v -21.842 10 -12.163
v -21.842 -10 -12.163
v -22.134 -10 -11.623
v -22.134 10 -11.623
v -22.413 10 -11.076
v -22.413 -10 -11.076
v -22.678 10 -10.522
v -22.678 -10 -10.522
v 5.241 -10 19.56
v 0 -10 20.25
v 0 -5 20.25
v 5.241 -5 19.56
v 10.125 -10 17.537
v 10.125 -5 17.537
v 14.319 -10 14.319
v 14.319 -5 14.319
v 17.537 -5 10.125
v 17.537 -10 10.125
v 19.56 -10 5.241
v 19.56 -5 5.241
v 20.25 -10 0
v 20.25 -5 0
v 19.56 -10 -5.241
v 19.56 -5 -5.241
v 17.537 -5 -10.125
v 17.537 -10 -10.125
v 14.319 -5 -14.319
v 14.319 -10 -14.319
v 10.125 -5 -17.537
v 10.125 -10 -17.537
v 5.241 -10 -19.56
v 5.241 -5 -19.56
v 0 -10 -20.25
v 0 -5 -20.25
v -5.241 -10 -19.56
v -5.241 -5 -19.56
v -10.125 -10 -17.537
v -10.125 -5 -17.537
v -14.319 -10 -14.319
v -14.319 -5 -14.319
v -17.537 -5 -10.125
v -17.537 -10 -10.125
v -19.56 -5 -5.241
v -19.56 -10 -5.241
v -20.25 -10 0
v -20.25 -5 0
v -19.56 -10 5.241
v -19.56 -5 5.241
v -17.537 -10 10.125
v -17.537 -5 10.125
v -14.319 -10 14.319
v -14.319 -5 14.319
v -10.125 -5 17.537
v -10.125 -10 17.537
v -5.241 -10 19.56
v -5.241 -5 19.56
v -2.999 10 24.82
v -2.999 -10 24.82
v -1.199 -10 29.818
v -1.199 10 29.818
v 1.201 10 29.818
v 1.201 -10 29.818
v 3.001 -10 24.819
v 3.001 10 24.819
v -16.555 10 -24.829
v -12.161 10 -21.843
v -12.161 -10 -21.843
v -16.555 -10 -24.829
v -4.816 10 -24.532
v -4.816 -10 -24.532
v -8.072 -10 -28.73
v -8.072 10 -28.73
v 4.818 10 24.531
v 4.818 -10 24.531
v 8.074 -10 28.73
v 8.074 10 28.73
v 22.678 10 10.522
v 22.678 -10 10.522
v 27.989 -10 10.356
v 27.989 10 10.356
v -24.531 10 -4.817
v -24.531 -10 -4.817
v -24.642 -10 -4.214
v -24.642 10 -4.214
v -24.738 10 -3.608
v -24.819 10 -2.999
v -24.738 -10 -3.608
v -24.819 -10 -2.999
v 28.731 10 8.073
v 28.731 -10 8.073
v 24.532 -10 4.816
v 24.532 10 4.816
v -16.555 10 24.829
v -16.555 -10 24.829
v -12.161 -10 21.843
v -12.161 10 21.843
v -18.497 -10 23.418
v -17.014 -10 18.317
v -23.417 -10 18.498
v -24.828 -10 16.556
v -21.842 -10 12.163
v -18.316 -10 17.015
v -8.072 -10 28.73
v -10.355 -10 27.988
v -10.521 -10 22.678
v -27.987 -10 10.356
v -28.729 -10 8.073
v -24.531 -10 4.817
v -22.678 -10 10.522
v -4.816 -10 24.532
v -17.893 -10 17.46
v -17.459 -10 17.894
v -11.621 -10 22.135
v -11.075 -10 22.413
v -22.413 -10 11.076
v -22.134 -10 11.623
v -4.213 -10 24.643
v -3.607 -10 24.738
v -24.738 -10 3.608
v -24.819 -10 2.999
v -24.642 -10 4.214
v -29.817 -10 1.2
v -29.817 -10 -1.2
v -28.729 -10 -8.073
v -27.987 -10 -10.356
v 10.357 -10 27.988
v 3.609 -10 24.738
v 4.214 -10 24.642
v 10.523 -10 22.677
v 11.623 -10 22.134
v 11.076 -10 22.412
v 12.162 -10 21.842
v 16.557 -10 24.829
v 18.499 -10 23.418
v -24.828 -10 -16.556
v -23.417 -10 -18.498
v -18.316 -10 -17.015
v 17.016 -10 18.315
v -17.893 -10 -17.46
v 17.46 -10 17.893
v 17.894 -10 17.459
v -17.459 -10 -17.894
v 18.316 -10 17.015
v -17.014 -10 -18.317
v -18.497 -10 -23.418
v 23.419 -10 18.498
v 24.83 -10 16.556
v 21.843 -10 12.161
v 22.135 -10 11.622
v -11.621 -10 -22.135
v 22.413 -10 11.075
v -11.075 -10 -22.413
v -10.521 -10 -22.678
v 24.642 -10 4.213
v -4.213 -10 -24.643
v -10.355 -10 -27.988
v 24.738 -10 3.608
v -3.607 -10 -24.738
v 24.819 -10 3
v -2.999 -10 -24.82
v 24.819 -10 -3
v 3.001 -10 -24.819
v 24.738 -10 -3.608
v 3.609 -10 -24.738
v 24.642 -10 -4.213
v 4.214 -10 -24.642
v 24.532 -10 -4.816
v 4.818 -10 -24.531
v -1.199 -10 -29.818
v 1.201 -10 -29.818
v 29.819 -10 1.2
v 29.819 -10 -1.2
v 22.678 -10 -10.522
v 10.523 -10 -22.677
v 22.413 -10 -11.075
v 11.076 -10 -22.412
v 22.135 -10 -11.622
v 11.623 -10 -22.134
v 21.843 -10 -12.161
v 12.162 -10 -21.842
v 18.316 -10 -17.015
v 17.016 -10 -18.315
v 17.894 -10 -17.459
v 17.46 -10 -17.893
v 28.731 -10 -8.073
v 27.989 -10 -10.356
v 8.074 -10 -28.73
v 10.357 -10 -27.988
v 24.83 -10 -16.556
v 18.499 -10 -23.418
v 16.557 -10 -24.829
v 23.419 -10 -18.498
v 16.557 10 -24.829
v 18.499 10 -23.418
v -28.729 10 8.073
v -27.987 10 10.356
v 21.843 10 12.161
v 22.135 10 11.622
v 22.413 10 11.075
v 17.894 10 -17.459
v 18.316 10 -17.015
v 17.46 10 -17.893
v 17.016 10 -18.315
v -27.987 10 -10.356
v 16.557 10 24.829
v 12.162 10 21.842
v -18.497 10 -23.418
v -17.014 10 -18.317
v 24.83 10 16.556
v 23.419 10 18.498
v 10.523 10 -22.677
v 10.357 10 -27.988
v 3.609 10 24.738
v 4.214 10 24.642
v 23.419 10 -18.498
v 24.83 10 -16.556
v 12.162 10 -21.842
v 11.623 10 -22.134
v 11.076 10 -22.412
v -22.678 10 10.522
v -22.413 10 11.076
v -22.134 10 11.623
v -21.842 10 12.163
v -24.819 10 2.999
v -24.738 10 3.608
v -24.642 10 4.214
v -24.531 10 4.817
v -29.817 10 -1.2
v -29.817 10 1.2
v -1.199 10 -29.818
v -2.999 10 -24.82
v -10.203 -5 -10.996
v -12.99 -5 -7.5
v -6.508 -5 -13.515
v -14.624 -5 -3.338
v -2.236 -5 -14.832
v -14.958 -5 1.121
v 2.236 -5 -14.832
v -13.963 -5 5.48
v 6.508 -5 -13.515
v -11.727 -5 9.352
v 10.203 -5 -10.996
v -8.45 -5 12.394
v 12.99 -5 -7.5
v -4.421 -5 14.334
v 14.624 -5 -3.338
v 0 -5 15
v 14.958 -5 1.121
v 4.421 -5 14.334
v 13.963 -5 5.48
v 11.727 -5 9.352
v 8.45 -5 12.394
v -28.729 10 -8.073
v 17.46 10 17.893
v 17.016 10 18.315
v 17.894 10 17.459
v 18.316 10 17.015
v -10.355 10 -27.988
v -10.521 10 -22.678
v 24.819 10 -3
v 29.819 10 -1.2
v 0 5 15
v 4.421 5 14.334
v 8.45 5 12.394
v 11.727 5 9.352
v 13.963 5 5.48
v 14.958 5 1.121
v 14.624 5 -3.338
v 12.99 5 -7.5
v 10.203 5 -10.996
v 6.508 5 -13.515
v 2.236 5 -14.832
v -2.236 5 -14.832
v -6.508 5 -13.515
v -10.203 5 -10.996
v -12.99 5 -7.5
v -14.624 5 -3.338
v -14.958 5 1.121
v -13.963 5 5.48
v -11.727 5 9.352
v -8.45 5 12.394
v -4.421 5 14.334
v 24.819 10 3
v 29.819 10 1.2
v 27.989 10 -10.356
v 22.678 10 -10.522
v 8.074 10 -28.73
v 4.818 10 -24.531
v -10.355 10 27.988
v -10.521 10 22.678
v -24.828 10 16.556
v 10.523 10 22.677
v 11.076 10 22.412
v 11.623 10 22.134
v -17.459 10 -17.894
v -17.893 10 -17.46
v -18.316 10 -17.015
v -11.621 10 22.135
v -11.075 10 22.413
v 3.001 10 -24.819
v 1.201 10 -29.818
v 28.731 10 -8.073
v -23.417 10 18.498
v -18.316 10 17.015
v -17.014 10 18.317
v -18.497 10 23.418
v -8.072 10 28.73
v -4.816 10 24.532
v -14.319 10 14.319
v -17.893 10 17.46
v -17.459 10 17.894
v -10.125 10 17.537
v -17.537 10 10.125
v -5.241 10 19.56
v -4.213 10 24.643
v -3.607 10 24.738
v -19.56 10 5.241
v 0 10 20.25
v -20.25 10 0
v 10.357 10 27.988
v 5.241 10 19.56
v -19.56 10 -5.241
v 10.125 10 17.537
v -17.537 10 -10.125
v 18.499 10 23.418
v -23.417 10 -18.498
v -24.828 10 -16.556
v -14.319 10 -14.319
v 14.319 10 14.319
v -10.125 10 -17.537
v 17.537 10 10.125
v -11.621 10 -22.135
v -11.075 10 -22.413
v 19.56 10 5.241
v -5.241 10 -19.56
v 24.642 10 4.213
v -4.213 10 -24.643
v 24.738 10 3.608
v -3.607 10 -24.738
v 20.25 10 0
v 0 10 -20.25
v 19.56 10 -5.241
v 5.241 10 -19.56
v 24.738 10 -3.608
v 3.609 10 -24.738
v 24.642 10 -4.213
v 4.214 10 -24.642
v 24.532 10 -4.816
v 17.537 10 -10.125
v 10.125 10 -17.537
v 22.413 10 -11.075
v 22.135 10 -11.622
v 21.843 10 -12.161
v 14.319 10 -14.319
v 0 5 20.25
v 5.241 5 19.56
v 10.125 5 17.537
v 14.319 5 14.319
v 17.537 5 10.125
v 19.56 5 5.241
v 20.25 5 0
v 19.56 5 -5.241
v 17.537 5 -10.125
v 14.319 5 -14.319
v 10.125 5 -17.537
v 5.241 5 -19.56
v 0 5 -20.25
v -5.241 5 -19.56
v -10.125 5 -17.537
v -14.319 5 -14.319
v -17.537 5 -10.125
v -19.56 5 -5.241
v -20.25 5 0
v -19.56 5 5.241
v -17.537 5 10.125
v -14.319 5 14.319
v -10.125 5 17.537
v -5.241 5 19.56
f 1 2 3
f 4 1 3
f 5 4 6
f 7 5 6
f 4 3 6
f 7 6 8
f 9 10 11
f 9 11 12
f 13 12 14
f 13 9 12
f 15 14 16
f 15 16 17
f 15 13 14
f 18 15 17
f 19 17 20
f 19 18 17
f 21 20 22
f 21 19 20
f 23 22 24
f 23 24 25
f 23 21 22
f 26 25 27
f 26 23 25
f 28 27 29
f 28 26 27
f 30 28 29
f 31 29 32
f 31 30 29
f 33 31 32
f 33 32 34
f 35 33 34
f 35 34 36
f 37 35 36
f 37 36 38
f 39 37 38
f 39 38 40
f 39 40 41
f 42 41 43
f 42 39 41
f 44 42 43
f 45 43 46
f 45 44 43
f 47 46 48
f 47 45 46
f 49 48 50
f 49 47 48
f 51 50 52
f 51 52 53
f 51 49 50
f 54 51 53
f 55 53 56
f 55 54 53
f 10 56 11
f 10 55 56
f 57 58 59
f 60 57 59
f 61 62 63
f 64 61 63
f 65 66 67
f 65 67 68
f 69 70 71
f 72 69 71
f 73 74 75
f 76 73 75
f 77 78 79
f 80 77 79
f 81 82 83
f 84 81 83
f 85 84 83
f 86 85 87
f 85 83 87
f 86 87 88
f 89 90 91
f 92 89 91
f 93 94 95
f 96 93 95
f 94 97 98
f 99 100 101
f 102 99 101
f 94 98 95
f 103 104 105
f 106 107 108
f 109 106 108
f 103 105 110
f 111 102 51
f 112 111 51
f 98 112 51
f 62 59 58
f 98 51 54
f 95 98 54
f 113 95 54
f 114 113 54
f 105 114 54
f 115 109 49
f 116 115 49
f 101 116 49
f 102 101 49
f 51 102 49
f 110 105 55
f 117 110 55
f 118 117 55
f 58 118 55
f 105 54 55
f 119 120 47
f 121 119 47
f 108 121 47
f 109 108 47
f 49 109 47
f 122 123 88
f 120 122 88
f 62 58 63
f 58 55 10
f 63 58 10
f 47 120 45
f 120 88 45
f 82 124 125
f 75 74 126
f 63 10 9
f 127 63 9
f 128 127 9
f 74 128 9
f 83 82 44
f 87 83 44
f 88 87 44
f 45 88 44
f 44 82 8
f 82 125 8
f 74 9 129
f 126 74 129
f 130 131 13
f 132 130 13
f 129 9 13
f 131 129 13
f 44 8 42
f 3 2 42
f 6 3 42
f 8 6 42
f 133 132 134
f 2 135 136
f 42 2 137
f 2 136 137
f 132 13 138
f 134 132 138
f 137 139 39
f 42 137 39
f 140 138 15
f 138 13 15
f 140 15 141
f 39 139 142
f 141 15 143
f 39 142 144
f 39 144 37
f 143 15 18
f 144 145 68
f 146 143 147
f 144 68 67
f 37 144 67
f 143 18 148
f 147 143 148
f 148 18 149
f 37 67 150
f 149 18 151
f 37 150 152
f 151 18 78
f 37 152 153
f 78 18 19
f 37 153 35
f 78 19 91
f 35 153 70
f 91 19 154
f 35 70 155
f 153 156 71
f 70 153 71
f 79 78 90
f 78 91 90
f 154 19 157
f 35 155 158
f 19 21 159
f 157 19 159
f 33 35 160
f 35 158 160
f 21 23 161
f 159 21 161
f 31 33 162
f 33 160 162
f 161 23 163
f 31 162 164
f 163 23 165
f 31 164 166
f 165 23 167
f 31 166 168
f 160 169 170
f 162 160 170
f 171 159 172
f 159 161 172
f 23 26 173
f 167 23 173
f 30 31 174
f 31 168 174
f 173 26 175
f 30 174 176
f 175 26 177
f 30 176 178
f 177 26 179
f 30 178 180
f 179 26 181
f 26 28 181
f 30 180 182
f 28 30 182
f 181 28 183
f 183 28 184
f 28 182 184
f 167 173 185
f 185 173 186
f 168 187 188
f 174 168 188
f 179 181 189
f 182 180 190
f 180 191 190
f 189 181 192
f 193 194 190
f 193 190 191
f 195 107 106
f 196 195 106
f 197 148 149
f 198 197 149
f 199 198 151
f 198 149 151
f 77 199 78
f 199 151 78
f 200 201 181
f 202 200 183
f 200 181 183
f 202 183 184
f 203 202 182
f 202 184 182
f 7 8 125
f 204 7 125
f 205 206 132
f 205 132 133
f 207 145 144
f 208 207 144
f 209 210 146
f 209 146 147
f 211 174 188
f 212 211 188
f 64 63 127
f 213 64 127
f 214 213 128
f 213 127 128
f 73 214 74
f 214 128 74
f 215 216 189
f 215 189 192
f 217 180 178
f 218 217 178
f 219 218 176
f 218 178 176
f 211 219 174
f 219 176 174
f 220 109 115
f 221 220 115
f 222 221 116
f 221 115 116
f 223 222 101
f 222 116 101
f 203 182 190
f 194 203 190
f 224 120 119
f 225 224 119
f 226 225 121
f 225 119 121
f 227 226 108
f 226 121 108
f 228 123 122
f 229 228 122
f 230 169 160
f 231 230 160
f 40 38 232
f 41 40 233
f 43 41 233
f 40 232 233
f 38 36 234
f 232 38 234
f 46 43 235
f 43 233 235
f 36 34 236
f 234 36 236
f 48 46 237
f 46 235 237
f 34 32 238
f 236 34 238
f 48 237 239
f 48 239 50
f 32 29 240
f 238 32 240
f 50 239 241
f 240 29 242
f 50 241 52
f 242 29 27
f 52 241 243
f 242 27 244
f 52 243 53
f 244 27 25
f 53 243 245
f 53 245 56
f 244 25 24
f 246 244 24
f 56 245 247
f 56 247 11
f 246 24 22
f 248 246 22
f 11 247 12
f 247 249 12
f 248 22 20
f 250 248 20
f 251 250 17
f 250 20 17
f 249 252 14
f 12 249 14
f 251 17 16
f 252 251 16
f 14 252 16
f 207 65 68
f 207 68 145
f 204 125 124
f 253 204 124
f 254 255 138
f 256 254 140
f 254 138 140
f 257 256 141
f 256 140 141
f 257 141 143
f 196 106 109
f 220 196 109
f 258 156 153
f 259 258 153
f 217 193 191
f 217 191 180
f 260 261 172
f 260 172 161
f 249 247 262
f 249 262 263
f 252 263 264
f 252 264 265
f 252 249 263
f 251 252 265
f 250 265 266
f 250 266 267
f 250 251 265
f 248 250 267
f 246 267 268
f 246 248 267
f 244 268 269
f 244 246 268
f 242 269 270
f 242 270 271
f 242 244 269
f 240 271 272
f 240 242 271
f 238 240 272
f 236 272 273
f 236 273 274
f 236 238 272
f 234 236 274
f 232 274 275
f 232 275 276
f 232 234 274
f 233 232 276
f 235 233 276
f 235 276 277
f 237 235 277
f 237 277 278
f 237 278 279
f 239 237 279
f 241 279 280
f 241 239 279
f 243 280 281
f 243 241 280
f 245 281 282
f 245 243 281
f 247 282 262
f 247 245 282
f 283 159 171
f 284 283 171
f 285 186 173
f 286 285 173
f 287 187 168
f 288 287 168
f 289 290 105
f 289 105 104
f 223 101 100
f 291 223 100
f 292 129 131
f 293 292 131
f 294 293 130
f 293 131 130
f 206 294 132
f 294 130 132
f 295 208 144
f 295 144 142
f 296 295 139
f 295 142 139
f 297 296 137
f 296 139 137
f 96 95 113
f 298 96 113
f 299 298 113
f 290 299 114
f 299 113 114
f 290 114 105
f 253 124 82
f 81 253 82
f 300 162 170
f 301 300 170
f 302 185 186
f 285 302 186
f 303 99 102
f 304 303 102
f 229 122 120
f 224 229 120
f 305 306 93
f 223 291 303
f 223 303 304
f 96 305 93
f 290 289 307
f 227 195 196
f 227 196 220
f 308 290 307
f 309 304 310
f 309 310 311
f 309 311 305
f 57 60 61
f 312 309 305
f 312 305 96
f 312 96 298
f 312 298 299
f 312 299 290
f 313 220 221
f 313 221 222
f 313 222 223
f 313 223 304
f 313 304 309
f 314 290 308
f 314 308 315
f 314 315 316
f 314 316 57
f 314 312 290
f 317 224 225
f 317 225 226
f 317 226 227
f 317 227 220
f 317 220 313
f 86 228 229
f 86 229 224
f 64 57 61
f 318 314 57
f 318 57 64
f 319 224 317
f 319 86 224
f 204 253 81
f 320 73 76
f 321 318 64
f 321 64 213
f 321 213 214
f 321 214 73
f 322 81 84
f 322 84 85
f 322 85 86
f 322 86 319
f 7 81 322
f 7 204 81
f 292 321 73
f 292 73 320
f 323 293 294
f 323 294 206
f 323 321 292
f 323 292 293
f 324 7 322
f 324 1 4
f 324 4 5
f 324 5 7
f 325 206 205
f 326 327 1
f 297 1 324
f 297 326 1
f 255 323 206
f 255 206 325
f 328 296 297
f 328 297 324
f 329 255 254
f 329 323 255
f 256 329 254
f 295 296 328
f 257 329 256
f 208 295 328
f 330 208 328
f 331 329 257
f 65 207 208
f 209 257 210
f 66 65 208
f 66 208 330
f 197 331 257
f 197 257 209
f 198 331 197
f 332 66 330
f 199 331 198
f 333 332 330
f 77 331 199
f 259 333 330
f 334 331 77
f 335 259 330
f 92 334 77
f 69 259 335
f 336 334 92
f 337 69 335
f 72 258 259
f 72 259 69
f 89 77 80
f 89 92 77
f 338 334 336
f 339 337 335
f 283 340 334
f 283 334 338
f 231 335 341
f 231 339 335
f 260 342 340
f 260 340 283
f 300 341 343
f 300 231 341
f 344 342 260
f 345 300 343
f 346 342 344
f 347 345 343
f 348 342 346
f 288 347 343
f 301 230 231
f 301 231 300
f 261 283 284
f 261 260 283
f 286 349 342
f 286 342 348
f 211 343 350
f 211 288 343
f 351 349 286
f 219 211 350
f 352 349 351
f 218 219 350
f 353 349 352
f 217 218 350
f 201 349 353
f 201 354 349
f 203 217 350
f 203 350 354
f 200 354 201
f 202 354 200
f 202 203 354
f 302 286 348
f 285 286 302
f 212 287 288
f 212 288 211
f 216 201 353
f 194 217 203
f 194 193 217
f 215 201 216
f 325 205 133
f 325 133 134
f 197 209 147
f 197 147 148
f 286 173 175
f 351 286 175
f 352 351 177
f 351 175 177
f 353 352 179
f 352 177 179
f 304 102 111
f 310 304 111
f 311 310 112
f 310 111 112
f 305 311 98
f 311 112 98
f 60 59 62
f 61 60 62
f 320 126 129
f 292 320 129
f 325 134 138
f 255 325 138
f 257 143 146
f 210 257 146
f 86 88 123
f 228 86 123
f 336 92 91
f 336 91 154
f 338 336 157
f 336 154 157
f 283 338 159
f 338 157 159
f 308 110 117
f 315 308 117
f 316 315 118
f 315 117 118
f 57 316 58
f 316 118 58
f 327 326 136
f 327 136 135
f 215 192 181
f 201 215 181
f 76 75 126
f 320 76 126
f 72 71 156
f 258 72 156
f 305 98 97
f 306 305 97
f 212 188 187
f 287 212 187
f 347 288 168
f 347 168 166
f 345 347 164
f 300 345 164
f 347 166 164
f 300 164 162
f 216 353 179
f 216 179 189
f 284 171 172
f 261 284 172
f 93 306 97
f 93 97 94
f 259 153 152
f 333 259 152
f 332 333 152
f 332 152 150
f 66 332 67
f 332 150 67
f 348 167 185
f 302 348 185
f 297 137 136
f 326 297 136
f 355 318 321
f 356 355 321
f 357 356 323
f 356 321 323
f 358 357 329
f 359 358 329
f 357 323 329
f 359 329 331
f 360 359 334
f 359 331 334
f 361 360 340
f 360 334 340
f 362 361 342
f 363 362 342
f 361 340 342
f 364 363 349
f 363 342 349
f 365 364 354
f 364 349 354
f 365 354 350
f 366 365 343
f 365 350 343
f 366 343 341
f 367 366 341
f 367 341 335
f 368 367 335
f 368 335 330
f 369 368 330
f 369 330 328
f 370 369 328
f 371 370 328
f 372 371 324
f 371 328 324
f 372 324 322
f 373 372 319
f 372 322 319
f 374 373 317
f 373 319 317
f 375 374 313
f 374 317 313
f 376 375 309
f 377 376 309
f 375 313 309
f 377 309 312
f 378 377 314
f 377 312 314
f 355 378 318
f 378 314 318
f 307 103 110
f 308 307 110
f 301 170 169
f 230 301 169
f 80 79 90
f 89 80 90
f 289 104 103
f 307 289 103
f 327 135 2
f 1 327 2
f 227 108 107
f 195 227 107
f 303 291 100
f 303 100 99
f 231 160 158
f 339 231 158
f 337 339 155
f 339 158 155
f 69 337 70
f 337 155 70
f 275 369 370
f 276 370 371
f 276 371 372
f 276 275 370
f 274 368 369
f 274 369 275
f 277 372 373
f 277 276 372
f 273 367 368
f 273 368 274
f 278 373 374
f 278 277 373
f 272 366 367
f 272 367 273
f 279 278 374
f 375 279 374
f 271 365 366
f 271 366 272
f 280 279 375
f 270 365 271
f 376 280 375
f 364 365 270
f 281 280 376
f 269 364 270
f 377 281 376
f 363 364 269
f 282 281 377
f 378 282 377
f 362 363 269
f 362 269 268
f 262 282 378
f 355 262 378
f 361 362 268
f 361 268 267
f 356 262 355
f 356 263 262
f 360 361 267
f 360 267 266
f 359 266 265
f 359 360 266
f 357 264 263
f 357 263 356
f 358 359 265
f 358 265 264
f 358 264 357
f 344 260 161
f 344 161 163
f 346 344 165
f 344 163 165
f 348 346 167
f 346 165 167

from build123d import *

# Parameters (mm, degrees)
BOSS_EXTRUDE2_START     = -10
BOSS_EXTRUDE2_DEPTH     = 20
CUT_EXTRUDE1_DEPTH      = 5
CUT_EXTRUDE1_DEPTH_BACK = 5
SKETCH3_R               = 15
SKETCH4_R               = 20.25
CUT_EXTRUDE2_DEPTH      = 5


# Read off the part's stored shape, not the designer's step: Boss-Extrude2
with BuildPart() as part:
    # Boss-Extrude2 outline → Boss-Extrude2 (new body)
    with BuildSketch(Plane(origin=(0, 0, 0), x_dir=(1, 0, 0), z_dir=(0, 1, 0)).offset(BOSS_EXTRUDE2_START)):
        with BuildLine():
            Line((24.819347292, -3), (29.819347292, -1.2))
            Line((29.819347292, -1.2), (29.819347292, 1.2))
            Line((29.819347292, 1.2), (24.819347292, 3))
            ThreePointArc((24.819347292, 3), (24.692232517, 3.910710079), (24.531712075, 4.81612943))
            Line((24.531712075, 4.81612943), (28.73075389, 8.073108238))
            Line((28.73075389, 8.073108238), (27.989113104, 10.355643877))
            Line((27.989113104, 10.355643877), (22.677695772, 10.522457624))
            ThreePointArc((22.677695772, 10.522457624), (22.275365258, 11.349365736), (21.842895395, 12.160917759))
            Line((21.842895395, 12.160917759), (24.829892006, 16.555964393))
            Line((24.829892006, 16.555964393), (23.419207401, 18.497605179))
            Line((23.419207401, 18.497605179), (18.316388565, 17.014990742))
            ThreePointArc((18.316388565, 17.014990742), (17.678159939, 17.677179107), (17.016006986, 18.315444473))
            Line((17.016006986, 18.315444473), (18.498605179, 23.418207401))
            Line((18.498605179, 23.418207401), (16.556964393, 24.828892006))
            Line((16.556964393, 24.828892006), (12.162276227, 21.84213902))
            ThreePointArc((12.162276227, 21.84213902), (11.350541159, 22.274766338), (10.523440542, 22.677239672))
            Line((10.523440542, 22.677239672), (10.356643877, 27.988113104))
            Line((10.356643877, 27.988113104), (8.074108238, 28.72975389))
            Line((8.074108238, 28.72975389), (4.817670386, 24.5314095))
            ThreePointArc((4.817670386, 24.5314095), (3.911818446, 24.69205695), (3.00066912, 24.819266404))
            Line((3.00066912, 24.819266404), (1.201, 29.818347292))
            Line((1.201, 29.818347292), (-1.199, 29.818347292))
            Line((-1.199, 29.818347292), (-2.998578144, 24.819519115))
            ThreePointArc((-2.998578144, 24.819519115), (-3.909904803, 24.692360042), (-4.815934726, 24.531750299))
            Line((-4.815934726, 24.531750299), (-8.072108238, 28.72975389))
            Line((-8.072108238, 28.72975389), (-10.354643877, 27.988113104))
            Line((-10.354643877, 27.988113104), (-10.521410966, 22.678181393))
            ThreePointArc((-10.521410966, 22.678181393), (-11.348983821, 22.275559841), (-12.16117688, 21.842751129))
            Line((-12.16117688, 21.842751129), (-16.554964393, 24.828892006))
            Line((-16.554964393, 24.828892006), (-18.496605179, 23.418207401))
            Line((-18.496605179, 23.418207401), (-17.014432073, 18.316907524))
            ThreePointArc((-17.014432073, 18.316907524), (-17.677179115, 17.678159931), (-18.315963478, 17.01544833))
            Line((-18.315963478, 17.01544833), (-23.417207401, 18.497605179))
            Line((-23.417207401, 18.497605179), (-24.827892006, 16.555964393))
            Line((-24.827892006, 16.555964393), (-21.841994742, 12.162535331))
            ThreePointArc((-21.841994742, 12.162535331), (-22.274960948, 11.350159239), (-22.677725349, 10.522393882))
            Line((-22.677725349, 10.522393882), (-27.987113104, 10.355643877))
            Line((-27.987113104, 10.355643877), (-28.72875389, 8.073108238))
            Line((-28.72875389, 8.073108238), (-24.531447735, 4.817475691))
            ThreePointArc((-24.531447735, 4.817475691), (-24.692184512, 3.91101317), (-24.819438268, 2.999247249))
            Line((-24.819438268, 2.999247249), (-29.817347292, 1.2))
            Line((-29.817347292, 1.2), (-29.817347292, -1.2))
            Line((-29.817347292, -1.2), (-24.819438268, -2.999247249))
            ThreePointArc((-24.819438268, -2.999247249), (-24.692184512, -3.91101317), (-24.531447735, -4.817475691))
            Line((-24.531447735, -4.817475691), (-28.72875389, -8.073108238))
            Line((-28.72875389, -8.073108238), (-27.987113104, -10.355643877))
            Line((-27.987113104, -10.355643877), (-22.677725349, -10.522393882))
            ThreePointArc((-22.677725349, -10.522393882), (-22.274960948, -11.350159239), (-21.841994742, -12.162535331))
            Line((-21.841994742, -12.162535331), (-24.827892006, -16.555964393))
            Line((-24.827892006, -16.555964393), (-23.417207401, -18.497605179))
            Line((-23.417207401, -18.497605179), (-18.315963478, -17.01544833))
            ThreePointArc((-18.315963478, -17.01544833), (-17.677179115, -17.678159931), (-17.014432073, -18.316907524))
            Line((-17.014432073, -18.316907524), (-18.496605179, -23.418207401))
            Line((-18.496605179, -23.418207401), (-16.554964393, -24.828892006))
            Line((-16.554964393, -24.828892006), (-12.16117688, -21.842751129))
            ThreePointArc((-12.16117688, -21.842751129), (-11.348983821, -22.275559841), (-10.521410966, -22.678181393))
            Line((-10.521410966, -22.678181393), (-10.354643877, -27.988113104))
            Line((-10.354643877, -27.988113104), (-8.072108238, -28.72975389))
            Line((-8.072108238, -28.72975389), (-4.815934726, -24.531750299))
            ThreePointArc((-4.815934726, -24.531750299), (-3.909904803, -24.692360042), (-2.998578144, -24.819519115))
            Line((-2.998578144, -24.819519115), (-1.199, -29.818347292))
            Line((-1.199, -29.818347292), (1.201, -29.818347292))
            Line((1.201, -29.818347292), (3.00066912, -24.819266404))
            ThreePointArc((3.00066912, -24.819266404), (3.911818446, -24.69205695), (4.817670386, -24.5314095))
            Line((4.817670386, -24.5314095), (8.074108238, -28.72975389))
            Line((8.074108238, -28.72975389), (10.356643877, -27.988113104))
            Line((10.356643877, -27.988113104), (10.523440542, -22.677239672))
            ThreePointArc((10.523440542, -22.677239672), (11.350541159, -22.274766338), (12.162276227, -21.84213902))
            Line((12.162276227, -21.84213902), (16.556964393, -24.828892006))
            Line((16.556964393, -24.828892006), (18.498605179, -23.418207401))
            Line((18.498605179, -23.418207401), (17.016006986, -18.315444473))
            ThreePointArc((17.016006986, -18.315444473), (17.678159939, -17.677179107), (18.316388565, -17.014990742))
            Line((18.316388565, -17.014990742), (23.419207401, -18.497605179))
            Line((23.419207401, -18.497605179), (24.829892006, -16.555964393))
            Line((24.829892006, -16.555964393), (21.842895395, -12.160917759))
            ThreePointArc((21.842895395, -12.160917759), (22.275365258, -11.349365736), (22.677695772, -10.522457624))
            Line((22.677695772, -10.522457624), (27.989113104, -10.355643877))
            Line((27.989113104, -10.355643877), (28.73075389, -8.073108238))
            Line((28.73075389, -8.073108238), (24.531712075, -4.81612943))
            ThreePointArc((24.531712075, -4.81612943), (24.692232517, -3.910710079), (24.819347292, -3))
        make_face()
    extrude(amount=BOSS_EXTRUDE2_DEPTH)

    # Sketch3 → Cut-Extrude1 (cut, two sides: drawn at the far end of the back side and taken through both)
    with BuildSketch(Plane(origin=(0, 0, 0), x_dir=(1, 0, 0), z_dir=(0, 1, 0)).offset(-CUT_EXTRUDE1_DEPTH_BACK)):
        with Locations(Location((0, 0, 0), (0, 0, 270))):
            Circle(SKETCH3_R)
    extrude(amount=CUT_EXTRUDE1_DEPTH + CUT_EXTRUDE1_DEPTH_BACK, mode=Mode.SUBTRACT)

    # Sketch4 → Cut-Extrude2 (cut)
    with BuildSketch(Plane(origin=(0, 10, 0), x_dir=(1, 0, 0), z_dir=(0, 1, 0))):
        with Locations(Location((0, 0, 0), (0, 0, 270))):
            Circle(SKETCH4_R)
    cut_extrude2 = extrude(amount=-CUT_EXTRUDE2_DEPTH, mode=Mode.SUBTRACT)

    # Mirror1: Cut-Extrude2 across plane
    add(cut_extrude2.mirror(Plane.ZX), mode=Mode.SUBTRACT)


solid = part.part
